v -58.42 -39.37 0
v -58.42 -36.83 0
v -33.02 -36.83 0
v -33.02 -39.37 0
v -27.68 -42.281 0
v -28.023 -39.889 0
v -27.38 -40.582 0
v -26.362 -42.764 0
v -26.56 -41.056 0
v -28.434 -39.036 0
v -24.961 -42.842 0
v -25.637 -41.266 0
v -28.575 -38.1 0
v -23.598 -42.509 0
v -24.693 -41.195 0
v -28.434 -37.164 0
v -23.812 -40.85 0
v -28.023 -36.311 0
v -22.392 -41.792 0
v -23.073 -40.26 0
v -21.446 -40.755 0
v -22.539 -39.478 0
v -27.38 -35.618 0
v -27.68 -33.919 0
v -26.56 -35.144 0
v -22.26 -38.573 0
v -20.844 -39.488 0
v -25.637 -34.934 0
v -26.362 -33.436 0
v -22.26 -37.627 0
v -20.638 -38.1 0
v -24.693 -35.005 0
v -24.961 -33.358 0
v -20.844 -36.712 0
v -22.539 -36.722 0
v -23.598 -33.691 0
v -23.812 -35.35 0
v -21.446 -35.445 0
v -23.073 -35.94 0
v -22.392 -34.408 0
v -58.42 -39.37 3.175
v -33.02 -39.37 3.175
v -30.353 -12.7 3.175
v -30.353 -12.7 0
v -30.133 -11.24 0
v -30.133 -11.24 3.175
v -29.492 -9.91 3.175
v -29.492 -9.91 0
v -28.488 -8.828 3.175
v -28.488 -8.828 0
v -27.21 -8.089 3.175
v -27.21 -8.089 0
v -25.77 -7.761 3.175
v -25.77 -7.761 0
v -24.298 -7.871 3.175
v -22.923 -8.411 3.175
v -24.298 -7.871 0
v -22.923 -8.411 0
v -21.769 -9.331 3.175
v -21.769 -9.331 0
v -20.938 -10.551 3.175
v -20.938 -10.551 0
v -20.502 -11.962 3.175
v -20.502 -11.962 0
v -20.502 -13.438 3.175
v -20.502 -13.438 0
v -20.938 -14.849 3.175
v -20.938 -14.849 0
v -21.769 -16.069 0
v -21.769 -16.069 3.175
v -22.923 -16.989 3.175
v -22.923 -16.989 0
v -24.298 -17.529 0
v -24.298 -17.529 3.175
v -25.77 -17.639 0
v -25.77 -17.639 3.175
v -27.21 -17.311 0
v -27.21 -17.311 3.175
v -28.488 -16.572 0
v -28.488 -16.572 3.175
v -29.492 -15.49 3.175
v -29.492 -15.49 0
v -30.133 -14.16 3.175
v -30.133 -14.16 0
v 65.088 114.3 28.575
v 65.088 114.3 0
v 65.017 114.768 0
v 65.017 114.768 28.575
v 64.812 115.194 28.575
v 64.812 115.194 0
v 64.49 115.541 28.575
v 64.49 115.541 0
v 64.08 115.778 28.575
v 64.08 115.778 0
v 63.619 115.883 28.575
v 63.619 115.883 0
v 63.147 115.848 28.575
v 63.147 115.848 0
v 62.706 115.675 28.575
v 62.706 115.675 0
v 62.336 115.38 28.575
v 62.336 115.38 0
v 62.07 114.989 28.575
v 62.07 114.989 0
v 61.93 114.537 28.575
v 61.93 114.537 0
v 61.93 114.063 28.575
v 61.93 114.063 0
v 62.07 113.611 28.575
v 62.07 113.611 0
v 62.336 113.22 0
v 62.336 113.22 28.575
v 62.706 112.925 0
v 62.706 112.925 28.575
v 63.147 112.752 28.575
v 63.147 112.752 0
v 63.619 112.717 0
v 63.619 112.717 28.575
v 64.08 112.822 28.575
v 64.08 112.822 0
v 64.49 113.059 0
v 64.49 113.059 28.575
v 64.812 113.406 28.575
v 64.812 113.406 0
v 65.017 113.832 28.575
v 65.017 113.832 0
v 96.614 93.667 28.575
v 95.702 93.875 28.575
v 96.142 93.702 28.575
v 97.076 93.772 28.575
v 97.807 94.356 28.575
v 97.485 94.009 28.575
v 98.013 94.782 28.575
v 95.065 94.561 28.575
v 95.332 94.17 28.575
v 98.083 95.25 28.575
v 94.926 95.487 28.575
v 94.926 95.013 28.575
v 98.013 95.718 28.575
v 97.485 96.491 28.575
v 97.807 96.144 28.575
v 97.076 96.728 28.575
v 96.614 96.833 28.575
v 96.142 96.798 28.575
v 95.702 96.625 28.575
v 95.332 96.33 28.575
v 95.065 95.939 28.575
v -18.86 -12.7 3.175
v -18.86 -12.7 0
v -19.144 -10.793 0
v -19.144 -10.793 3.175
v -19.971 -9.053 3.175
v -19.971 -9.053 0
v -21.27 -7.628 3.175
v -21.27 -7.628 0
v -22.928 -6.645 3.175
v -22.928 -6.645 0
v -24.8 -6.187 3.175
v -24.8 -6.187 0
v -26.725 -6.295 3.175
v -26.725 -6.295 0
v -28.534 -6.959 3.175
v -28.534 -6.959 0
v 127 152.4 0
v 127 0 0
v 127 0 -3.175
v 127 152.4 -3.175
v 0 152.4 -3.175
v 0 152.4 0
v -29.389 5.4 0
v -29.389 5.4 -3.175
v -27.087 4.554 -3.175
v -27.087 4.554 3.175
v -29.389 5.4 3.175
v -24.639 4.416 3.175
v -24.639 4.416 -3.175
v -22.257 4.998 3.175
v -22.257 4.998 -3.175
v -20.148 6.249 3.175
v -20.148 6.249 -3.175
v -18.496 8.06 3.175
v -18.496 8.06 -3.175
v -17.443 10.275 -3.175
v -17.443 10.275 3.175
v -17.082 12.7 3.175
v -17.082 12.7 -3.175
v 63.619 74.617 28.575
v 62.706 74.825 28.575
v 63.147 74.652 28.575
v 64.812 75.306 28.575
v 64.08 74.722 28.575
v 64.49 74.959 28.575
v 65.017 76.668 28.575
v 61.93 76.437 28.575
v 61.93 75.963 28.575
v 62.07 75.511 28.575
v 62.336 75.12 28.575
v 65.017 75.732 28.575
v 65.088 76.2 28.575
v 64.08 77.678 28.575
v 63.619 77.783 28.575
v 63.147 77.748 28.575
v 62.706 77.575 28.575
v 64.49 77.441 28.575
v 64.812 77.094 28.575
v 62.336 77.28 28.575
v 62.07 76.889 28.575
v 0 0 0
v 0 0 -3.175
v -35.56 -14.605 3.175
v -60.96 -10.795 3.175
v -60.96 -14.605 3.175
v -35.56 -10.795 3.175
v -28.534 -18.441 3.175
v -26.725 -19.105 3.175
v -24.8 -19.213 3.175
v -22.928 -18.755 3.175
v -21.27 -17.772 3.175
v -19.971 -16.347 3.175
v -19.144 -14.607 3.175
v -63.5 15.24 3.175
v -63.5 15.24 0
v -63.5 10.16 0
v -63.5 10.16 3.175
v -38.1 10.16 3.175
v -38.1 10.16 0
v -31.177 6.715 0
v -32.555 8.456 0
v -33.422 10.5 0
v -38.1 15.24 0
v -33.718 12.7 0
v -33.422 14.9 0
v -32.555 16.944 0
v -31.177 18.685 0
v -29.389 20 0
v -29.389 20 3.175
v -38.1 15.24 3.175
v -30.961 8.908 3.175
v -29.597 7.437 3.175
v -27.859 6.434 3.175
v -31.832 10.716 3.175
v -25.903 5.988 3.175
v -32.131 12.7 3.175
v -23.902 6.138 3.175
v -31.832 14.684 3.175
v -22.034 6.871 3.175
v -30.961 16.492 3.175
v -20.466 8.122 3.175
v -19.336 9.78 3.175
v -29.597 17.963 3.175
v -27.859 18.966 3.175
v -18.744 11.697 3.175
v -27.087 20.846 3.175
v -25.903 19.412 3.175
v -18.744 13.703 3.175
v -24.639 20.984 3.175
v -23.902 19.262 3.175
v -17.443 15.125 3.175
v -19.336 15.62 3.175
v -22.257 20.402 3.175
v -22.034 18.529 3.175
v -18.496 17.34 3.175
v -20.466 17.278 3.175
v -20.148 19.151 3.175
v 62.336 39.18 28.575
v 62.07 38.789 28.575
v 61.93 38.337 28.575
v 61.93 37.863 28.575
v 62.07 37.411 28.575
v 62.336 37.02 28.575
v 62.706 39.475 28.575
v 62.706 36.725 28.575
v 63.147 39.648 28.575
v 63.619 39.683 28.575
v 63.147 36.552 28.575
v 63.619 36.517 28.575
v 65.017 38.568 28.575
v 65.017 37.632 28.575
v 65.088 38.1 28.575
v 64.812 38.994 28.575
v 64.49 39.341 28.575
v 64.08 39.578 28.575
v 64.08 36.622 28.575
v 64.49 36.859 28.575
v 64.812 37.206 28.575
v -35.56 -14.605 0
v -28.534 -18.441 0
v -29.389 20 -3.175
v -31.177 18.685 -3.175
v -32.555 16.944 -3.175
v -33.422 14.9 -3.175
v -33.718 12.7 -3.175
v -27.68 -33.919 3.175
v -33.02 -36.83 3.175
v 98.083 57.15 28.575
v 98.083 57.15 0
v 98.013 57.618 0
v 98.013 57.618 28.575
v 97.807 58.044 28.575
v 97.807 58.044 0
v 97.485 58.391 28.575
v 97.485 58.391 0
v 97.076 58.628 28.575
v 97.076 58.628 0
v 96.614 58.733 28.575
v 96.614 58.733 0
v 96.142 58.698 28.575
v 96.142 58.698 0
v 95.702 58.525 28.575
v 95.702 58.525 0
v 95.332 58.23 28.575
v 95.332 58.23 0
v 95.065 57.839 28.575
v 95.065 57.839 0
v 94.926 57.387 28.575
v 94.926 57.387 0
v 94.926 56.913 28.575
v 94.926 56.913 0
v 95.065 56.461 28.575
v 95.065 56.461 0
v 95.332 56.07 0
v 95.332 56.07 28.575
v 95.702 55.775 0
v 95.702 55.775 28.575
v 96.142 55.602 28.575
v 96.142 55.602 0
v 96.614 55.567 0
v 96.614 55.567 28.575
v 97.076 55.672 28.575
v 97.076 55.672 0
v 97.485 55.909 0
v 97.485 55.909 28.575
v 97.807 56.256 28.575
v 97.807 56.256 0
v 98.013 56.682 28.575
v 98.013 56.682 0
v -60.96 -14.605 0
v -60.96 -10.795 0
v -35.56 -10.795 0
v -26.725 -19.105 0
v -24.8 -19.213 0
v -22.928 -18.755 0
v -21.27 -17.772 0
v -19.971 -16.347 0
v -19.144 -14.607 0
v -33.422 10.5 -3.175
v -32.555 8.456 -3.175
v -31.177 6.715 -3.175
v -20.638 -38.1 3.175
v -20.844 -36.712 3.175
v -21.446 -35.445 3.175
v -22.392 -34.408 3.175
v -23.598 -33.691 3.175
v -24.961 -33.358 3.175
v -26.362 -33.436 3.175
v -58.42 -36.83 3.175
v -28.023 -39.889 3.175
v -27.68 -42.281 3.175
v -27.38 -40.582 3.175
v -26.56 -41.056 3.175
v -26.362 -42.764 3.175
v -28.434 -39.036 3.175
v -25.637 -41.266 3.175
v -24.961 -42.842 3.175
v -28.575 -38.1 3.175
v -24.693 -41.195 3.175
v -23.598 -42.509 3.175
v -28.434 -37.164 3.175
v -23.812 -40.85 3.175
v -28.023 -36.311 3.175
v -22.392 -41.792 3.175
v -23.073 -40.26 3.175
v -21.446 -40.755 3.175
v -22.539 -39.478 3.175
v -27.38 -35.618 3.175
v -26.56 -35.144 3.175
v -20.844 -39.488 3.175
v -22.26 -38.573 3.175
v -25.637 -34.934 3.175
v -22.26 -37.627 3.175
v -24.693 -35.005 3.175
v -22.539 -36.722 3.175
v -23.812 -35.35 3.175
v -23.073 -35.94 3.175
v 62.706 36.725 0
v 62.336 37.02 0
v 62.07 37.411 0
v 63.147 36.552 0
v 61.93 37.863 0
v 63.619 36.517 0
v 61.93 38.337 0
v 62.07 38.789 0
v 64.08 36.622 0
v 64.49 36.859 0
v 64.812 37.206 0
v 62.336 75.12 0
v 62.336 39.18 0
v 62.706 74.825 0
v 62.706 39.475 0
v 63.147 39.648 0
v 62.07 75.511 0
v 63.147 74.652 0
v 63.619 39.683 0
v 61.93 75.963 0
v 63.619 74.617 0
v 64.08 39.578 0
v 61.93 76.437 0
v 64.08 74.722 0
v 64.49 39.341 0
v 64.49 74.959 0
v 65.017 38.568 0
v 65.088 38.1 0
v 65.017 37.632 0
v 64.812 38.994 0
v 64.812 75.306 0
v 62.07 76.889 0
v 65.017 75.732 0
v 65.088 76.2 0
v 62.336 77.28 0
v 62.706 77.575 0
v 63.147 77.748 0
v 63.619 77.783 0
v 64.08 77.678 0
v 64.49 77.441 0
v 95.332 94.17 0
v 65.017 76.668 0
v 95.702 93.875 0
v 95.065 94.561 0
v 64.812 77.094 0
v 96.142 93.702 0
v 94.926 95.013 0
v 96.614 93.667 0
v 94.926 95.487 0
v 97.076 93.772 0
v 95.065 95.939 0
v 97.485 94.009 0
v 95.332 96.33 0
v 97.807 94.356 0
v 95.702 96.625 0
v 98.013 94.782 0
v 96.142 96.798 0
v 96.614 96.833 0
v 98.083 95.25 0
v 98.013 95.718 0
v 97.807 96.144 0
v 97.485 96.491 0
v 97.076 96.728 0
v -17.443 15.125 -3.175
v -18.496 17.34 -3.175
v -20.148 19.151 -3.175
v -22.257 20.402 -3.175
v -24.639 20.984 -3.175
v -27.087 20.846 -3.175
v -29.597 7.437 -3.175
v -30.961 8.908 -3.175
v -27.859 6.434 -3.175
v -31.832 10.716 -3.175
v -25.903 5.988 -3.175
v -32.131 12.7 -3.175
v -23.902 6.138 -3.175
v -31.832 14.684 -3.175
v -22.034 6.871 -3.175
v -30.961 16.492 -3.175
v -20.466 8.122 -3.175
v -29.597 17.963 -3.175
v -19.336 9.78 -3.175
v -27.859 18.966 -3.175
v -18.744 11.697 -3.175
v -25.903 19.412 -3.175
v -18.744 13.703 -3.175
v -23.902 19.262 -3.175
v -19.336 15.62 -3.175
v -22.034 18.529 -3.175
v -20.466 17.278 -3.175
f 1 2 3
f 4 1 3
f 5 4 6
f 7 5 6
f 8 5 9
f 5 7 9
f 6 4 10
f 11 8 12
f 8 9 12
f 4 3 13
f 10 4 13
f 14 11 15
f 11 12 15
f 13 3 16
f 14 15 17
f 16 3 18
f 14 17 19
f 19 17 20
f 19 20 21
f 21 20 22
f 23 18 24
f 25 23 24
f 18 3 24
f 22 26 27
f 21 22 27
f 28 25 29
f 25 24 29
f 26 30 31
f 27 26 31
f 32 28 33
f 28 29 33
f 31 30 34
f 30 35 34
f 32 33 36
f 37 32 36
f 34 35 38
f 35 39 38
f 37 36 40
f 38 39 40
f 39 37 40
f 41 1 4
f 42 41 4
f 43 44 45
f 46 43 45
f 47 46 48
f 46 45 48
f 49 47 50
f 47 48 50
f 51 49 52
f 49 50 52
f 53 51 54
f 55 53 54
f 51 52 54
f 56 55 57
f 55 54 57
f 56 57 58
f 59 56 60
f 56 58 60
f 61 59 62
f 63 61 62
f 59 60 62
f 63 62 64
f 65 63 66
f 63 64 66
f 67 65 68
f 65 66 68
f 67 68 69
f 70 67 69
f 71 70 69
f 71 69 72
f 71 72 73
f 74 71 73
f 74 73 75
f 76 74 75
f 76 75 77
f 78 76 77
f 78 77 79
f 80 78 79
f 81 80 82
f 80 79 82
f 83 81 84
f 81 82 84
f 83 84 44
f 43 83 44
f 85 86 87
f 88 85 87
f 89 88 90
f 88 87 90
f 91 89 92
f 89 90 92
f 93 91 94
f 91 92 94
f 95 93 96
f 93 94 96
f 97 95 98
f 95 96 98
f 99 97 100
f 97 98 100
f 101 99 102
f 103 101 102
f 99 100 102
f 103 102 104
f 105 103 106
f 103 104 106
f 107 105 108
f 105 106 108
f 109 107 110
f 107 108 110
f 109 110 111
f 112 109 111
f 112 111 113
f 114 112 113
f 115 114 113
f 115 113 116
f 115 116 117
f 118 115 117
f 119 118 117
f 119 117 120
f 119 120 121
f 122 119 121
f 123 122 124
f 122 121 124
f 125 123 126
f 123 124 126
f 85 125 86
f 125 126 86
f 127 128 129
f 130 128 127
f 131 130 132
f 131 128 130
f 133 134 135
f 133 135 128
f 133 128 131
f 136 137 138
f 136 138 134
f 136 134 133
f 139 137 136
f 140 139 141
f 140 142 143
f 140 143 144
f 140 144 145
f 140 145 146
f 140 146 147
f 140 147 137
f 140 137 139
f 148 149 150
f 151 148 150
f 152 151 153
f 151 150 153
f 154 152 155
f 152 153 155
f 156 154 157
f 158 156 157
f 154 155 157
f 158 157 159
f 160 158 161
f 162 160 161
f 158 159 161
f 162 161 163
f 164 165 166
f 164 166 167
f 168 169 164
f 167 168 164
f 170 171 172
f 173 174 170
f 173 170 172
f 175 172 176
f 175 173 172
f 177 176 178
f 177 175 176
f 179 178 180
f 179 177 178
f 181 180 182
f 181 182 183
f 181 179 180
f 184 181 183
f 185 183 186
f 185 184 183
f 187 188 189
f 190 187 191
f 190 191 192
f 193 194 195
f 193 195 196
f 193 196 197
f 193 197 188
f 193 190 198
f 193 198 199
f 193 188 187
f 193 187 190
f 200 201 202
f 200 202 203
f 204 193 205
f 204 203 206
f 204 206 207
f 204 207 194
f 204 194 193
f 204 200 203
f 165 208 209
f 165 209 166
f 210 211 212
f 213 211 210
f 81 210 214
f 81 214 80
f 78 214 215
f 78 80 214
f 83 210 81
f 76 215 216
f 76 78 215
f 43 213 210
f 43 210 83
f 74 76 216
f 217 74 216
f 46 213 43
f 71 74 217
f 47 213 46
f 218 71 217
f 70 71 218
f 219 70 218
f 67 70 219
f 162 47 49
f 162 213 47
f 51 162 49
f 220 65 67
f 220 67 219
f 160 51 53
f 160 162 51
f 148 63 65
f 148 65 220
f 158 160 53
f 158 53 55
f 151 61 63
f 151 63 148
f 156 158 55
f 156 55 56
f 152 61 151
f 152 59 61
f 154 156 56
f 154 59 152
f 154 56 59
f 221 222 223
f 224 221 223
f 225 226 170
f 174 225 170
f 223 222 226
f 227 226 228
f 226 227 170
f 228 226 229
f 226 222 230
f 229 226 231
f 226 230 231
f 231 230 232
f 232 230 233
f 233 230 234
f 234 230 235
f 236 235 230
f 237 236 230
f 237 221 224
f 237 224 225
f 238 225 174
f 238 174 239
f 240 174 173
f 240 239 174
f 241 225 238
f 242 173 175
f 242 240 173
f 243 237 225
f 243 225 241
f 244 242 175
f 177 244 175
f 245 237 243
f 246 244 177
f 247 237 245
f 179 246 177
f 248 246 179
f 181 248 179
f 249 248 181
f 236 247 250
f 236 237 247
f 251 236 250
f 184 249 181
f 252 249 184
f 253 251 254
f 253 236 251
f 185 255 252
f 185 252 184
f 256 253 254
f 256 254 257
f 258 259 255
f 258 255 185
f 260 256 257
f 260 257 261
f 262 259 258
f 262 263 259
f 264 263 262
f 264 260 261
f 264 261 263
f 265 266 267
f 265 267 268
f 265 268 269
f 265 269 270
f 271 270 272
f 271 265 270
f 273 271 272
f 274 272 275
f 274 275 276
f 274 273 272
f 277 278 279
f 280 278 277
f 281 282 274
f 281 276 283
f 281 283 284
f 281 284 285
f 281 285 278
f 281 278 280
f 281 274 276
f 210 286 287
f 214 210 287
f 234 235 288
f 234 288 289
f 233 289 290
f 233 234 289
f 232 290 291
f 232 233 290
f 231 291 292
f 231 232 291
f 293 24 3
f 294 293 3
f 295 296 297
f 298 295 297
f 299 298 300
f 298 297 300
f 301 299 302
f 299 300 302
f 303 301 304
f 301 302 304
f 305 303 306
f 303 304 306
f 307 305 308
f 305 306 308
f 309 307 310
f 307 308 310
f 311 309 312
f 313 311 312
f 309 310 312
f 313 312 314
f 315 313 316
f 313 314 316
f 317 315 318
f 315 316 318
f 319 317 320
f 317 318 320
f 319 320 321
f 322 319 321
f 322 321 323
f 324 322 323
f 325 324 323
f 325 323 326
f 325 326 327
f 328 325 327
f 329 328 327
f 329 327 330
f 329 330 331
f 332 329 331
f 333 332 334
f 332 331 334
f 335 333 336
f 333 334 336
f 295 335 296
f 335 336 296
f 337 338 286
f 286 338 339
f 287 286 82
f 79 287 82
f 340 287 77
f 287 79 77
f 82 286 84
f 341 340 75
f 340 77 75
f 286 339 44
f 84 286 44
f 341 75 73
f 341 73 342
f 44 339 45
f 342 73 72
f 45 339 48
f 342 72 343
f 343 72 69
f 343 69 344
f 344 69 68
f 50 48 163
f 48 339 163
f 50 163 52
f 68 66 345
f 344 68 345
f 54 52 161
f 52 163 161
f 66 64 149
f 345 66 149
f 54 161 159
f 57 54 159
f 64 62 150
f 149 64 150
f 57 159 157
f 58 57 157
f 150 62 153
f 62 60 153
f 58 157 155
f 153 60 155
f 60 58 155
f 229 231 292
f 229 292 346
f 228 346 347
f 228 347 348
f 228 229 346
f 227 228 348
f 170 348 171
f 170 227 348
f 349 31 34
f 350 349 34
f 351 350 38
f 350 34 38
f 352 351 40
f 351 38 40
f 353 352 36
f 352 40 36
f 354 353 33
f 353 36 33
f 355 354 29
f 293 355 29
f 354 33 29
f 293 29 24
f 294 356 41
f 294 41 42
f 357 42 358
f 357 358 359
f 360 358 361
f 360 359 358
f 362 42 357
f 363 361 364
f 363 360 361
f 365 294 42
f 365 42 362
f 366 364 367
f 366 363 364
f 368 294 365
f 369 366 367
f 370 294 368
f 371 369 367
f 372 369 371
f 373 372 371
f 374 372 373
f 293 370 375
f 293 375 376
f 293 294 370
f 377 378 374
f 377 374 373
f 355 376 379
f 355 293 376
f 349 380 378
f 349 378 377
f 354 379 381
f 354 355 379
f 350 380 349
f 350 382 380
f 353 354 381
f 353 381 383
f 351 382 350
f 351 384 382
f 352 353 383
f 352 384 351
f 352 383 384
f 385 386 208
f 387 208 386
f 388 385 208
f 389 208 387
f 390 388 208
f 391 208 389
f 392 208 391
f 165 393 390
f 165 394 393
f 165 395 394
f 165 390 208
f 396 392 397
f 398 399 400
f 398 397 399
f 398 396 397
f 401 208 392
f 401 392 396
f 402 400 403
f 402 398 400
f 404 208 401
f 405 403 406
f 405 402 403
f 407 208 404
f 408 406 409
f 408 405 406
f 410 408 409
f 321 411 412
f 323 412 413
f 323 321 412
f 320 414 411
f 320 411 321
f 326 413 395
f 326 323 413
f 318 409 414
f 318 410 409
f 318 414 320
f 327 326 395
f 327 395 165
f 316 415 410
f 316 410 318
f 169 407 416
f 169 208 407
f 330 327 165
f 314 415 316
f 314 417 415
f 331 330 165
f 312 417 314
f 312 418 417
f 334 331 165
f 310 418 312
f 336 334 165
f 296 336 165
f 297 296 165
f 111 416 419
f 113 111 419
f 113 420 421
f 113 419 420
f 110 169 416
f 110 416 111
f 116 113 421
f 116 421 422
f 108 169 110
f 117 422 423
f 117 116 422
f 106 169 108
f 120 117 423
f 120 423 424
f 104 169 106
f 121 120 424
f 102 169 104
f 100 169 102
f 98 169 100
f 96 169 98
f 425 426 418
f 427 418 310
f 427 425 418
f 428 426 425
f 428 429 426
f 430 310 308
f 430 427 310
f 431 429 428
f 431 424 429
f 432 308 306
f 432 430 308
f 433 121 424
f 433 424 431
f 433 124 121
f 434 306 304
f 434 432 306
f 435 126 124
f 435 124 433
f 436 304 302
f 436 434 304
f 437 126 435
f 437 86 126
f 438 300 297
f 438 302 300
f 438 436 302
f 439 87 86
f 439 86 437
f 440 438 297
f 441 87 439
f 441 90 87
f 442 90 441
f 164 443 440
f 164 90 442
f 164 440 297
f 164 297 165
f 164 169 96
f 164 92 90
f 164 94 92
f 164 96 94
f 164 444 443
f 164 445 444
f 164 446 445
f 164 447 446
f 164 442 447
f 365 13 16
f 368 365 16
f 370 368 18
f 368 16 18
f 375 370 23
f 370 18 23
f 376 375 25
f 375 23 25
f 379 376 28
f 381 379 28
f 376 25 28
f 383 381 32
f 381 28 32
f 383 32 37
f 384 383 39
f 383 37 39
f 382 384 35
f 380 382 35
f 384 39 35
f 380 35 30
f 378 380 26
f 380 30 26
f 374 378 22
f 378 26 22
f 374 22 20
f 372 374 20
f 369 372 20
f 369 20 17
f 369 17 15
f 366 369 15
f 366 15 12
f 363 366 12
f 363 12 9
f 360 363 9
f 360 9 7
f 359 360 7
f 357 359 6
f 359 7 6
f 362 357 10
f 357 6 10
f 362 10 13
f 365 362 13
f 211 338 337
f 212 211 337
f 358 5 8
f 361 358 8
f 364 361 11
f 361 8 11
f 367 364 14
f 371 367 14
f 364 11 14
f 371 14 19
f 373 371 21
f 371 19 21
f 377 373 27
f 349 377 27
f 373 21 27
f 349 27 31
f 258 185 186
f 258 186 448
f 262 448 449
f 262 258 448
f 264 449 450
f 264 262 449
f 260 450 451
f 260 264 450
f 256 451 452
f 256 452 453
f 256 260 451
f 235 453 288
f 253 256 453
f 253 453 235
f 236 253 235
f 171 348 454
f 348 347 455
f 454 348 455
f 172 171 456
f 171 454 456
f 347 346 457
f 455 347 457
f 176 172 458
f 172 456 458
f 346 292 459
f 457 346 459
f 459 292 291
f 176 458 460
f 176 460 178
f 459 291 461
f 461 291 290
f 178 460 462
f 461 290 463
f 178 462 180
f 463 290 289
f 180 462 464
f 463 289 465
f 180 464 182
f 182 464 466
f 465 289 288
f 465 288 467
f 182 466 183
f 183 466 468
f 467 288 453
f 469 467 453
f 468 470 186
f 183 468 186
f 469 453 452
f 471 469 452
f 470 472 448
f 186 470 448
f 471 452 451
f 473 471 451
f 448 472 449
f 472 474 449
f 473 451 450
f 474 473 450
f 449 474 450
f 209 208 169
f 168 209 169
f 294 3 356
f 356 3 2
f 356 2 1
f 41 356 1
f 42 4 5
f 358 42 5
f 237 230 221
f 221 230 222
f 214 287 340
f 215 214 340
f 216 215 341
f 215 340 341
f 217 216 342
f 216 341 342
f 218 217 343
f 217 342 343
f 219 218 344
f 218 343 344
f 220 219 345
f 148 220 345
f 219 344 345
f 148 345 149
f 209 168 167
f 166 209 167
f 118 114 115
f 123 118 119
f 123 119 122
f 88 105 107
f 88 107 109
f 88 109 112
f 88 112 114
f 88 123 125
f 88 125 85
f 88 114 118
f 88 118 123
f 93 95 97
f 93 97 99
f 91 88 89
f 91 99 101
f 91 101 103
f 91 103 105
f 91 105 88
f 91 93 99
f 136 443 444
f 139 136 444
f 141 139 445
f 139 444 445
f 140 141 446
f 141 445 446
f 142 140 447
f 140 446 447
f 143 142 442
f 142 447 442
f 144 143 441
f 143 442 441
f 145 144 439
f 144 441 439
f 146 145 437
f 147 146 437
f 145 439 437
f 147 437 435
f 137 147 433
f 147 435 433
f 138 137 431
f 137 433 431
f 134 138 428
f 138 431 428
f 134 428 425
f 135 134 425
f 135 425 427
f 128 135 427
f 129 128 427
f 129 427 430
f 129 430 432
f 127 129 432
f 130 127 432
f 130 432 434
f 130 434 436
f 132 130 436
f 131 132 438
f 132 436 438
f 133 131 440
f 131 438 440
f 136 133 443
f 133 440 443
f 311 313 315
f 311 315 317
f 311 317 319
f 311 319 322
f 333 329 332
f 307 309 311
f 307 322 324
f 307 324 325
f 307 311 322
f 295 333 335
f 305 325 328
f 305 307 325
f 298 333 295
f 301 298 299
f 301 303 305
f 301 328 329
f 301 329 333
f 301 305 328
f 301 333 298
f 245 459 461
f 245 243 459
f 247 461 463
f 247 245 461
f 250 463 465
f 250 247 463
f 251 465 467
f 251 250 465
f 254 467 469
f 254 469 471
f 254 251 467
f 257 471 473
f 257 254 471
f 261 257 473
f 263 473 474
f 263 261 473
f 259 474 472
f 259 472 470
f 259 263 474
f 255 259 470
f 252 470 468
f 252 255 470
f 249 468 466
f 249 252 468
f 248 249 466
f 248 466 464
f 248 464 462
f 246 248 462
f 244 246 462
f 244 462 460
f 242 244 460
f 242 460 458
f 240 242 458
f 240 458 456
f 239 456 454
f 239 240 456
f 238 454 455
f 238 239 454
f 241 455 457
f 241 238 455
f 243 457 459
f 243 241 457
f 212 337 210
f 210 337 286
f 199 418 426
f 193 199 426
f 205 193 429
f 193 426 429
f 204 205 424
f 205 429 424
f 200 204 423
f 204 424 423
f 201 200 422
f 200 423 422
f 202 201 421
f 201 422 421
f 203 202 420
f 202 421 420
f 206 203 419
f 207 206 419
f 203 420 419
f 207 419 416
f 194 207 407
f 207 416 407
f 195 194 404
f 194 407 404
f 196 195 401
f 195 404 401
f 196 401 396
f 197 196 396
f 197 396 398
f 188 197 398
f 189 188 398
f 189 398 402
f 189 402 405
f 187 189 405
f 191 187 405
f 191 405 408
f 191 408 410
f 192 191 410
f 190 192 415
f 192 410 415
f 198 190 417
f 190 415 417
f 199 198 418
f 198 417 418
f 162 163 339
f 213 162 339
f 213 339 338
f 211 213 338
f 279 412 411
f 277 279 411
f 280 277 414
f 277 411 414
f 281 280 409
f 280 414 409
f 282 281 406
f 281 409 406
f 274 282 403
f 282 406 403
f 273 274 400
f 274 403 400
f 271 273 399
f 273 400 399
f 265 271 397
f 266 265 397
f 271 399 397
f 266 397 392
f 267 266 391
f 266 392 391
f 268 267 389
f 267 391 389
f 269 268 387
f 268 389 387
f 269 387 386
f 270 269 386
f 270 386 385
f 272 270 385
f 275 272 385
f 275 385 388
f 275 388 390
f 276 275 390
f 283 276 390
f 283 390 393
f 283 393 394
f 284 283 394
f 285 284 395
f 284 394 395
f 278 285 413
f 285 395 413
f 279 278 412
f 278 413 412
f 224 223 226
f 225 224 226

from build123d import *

# Parameters (mm, degrees)
F0_W     = 127
F0_H     = 152.4
F0_R     = 1.5875
F1_DEPTH = 3.175
F2_DEPTH = 28.575
F3_DEPTH = 3.175
F4_DEPTH = 3.175
F5_DEPTH = 3.175
F6_DEPTH = 3.175


with BuildPart() as f1:
    # F0 (on Top) → F1 (new body)
    with BuildSketch(Plane.XY):
        with Locations((63.5, 76.2)):
            Rectangle(F0_W, F0_H)
        with Locations((63.5, 38.1)):
            Circle(F0_R, mode=Mode.SUBTRACT)
        with Locations((30.504432, 57.15)):
            Circle(F0_R, mode=Mode.SUBTRACT)
        with Locations((30.504432, 95.25)):
            Circle(F0_R, mode=Mode.SUBTRACT)
        with Locations((63.5, 76.2)):
            Circle(F0_R, mode=Mode.SUBTRACT)
        with Locations((96.495568, 57.15)):
            Circle(F0_R, mode=Mode.SUBTRACT)
        with Locations((96.495568, 95.25)):
            Circle(F0_R, mode=Mode.SUBTRACT)
        with Locations((63.5, 114.3)):
            Circle(F0_R, mode=Mode.SUBTRACT)
        with Locations((63.5, 114.3)):
            Circle(F0_R)
        with Locations((96.495568, 95.25)):
            Circle(F0_R)
        with Locations((96.495568, 57.15)):
            Circle(F0_R)
        with Locations((63.5, 38.1)):
            Circle(F0_R)
        with Locations((30.504432, 57.15)):
            Circle(F0_R)
        with Locations((30.504432, 95.25)):
            Circle(F0_R)
        with Locations((63.5, 76.2)):
            Circle(F0_R)
    extrude(amount=-F1_DEPTH)

    # F0 (on Top) → F2 (join)
    with BuildSketch(Plane.XY):
        with Locations((63.5, 114.3)):
            Circle(F0_R)
        with Locations((96.495568, 95.25)):
            Circle(F0_R)
        with Locations((63.5, 76.2)):
            Circle(F0_R)
        with Locations((96.495568, 57.15)):
            Circle(F0_R)
        with Locations((63.5, 38.1)):
            Circle(F0_R)
    extrude(amount=F2_DEPTH)


with BuildPart() as f3:
    # F0 (on Top) → F3 (new body)
    with BuildSketch(Plane.XY):
        with BuildLine():
            ThreePointArc((-29.388643, 5.400125), (-21.156304, 5.545387), (-17.0815, 12.7))
            ThreePointArc((-17.0815, 12.7), (-21.156304, 19.854613), (-29.388643, 19.999875))
            ThreePointArc((-29.388643, 19.999875), (-32.554613, 16.943696), (-33.7185, 12.7))
            ThreePointArc((-33.7185, 12.7), (-32.554613, 8.456304), (-29.388643, 5.400125))
        make_face()
        with BuildLine():
            ThreePointArc((-18.669, 12.7), (-25.4, 5.969), (-32.131, 12.7))
            ThreePointArc((-32.131, 12.7), (-25.4, 19.431), (-18.669, 12.7))
        make_face(mode=Mode.SUBTRACT)
        with BuildLine():
            ThreePointArc((-33.7185, 12.7), (-32.554613, 16.943696), (-29.388643, 19.999875))
            Line((-29.388643, 19.999875), (-38.1, 15.24))
            Line((-38.1, 15.24), (-38.1, 12.7))
            Line((-38.1, 12.7), (-33.7185, 12.7))
        make_face()
        with BuildLine():
            Line((-38.1, 10.16), (-29.388643, 5.400125))
            ThreePointArc((-29.388643, 5.400125), (-32.554613, 8.456304), (-33.7185, 12.7))
            Line((-33.7185, 12.7), (-38.1, 12.7))
            Line((-38.1, 12.7), (-38.1, 10.16))
        make_face()
        Polygon((-38.1, 12.7), (-38.1, 15.24), (-63.5, 15.24), (-63.5, 10.16), (-38.1, 10.16), align=None)
    extrude(amount=F3_DEPTH)

    # F0 (on Top) → F4 (join)
    with BuildSketch(Plane.XY):
        with BuildLine():
            ThreePointArc((-29.388643, 5.400125), (-21.156304, 5.545387), (-17.0815, 12.7))
            ThreePointArc((-17.0815, 12.7), (-21.156304, 19.854613), (-29.388643, 19.999875))
            ThreePointArc((-29.388643, 19.999875), (-32.554613, 16.943696), (-33.7185, 12.7))
            ThreePointArc((-33.7185, 12.7), (-32.554613, 8.456304), (-29.388643, 5.400125))
        make_face()
        with BuildLine():
            ThreePointArc((-18.669, 12.7), (-25.4, 5.969), (-32.131, 12.7))
            ThreePointArc((-32.131, 12.7), (-25.4, 19.431), (-18.669, 12.7))
        make_face(mode=Mode.SUBTRACT)
    extrude(amount=-F4_DEPTH)


with BuildPart() as f5:
    # F0 (on Top) → F5 (new body)
    with BuildSketch(Plane.XY):
        with BuildLine():
            ThreePointArc((-28.534063, -18.440713), (-22.062351, -18.324788), (-18.8595, -12.7))
            ThreePointArc((-18.8595, -12.7), (-22.062351, -7.075212), (-28.534063, -6.959287))
            ThreePointArc((-28.534063, -6.959287), (-31.024788, -9.362351), (-31.9405, -12.7))
            ThreePointArc((-31.9405, -12.7), (-31.024788, -16.037649), (-28.534063, -18.440713))
        make_face()
        with BuildLine():
            ThreePointArc((-20.447, -12.7), (-25.4, -17.653), (-30.353, -12.7))
            ThreePointArc((-30.353, -12.7), (-25.4, -7.747), (-20.447, -12.7))
        make_face(mode=Mode.SUBTRACT)
        with BuildLine():
            Line((-35.56, -14.605), (-28.534063, -18.440713))
            ThreePointArc((-28.534063, -18.440713), (-31.024788, -16.037649), (-31.9405, -12.7))
            Line((-31.9405, -12.7), (-35.56, -12.7))
            Line((-35.56, -12.7), (-35.56, -14.605))
        make_face()
        with BuildLine():
            ThreePointArc((-31.9405, -12.7), (-31.024788, -9.362351), (-28.534063, -6.959287))
            Line((-28.534063, -6.959287), (-35.56, -10.795))
            Line((-35.56, -10.795), (-35.56, -12.7))
            Line((-35.56, -12.7), (-31.9405, -12.7))
        make_face()
        Polygon((-35.56, -12.7), (-35.56, -10.795), (-60.96, -10.795), (-60.96, -14.605), (-35.56, -14.605), align=None)
    extrude(amount=F5_DEPTH)


with BuildPart() as f6:
    # F0 (on Top) → F6 (new body)
    with BuildSketch(Plane.XY):
        with BuildLine():
            ThreePointArc((-27.679653, -42.281458), (-22.968482, -42.195012), (-20.6375, -38.1))
            ThreePointArc((-20.6375, -38.1), (-22.968482, -34.004988), (-27.679653, -33.918542))
            ThreePointArc((-27.679653, -33.918542), (-29.495012, -35.668482), (-30.1625, -38.1))
            ThreePointArc((-30.1625, -38.1), (-29.495012, -40.531518), (-27.679653, -42.281458))
        make_face()
        with BuildLine():
            ThreePointArc((-22.225, -38.1), (-25.4, -41.275), (-28.575, -38.1))
            ThreePointArc((-28.575, -38.1), (-25.4, -34.925), (-22.225, -38.1))
        make_face(mode=Mode.SUBTRACT)
        with BuildLine():
            ThreePointArc((-30.1625, -38.1), (-29.495012, -35.668482), (-27.679653, -33.918542))
            Line((-27.679653, -33.918542), (-33.02, -36.83))
            Line((-33.02, -36.83), (-33.02, -38.1))
            Line((-33.02, -38.1), (-30.1625, -38.1))
        make_face()
        with BuildLine():
            Line((-33.02, -39.37), (-27.679653, -42.281458))
            ThreePointArc((-27.679653, -42.281458), (-29.495012, -40.531518), (-30.1625, -38.1))
            Line((-30.1625, -38.1), (-33.02, -38.1))
            Line((-33.02, -38.1), (-33.02, -39.37))
        make_face()
        Polygon((-33.02, -38.1), (-33.02, -36.83), (-58.42, -36.83), (-58.42, -39.37), (-33.02, -39.37), align=None)
    extrude(amount=F6_DEPTH)


solid = Compound([f1.part, f3.part, f5.part, f6.part])
